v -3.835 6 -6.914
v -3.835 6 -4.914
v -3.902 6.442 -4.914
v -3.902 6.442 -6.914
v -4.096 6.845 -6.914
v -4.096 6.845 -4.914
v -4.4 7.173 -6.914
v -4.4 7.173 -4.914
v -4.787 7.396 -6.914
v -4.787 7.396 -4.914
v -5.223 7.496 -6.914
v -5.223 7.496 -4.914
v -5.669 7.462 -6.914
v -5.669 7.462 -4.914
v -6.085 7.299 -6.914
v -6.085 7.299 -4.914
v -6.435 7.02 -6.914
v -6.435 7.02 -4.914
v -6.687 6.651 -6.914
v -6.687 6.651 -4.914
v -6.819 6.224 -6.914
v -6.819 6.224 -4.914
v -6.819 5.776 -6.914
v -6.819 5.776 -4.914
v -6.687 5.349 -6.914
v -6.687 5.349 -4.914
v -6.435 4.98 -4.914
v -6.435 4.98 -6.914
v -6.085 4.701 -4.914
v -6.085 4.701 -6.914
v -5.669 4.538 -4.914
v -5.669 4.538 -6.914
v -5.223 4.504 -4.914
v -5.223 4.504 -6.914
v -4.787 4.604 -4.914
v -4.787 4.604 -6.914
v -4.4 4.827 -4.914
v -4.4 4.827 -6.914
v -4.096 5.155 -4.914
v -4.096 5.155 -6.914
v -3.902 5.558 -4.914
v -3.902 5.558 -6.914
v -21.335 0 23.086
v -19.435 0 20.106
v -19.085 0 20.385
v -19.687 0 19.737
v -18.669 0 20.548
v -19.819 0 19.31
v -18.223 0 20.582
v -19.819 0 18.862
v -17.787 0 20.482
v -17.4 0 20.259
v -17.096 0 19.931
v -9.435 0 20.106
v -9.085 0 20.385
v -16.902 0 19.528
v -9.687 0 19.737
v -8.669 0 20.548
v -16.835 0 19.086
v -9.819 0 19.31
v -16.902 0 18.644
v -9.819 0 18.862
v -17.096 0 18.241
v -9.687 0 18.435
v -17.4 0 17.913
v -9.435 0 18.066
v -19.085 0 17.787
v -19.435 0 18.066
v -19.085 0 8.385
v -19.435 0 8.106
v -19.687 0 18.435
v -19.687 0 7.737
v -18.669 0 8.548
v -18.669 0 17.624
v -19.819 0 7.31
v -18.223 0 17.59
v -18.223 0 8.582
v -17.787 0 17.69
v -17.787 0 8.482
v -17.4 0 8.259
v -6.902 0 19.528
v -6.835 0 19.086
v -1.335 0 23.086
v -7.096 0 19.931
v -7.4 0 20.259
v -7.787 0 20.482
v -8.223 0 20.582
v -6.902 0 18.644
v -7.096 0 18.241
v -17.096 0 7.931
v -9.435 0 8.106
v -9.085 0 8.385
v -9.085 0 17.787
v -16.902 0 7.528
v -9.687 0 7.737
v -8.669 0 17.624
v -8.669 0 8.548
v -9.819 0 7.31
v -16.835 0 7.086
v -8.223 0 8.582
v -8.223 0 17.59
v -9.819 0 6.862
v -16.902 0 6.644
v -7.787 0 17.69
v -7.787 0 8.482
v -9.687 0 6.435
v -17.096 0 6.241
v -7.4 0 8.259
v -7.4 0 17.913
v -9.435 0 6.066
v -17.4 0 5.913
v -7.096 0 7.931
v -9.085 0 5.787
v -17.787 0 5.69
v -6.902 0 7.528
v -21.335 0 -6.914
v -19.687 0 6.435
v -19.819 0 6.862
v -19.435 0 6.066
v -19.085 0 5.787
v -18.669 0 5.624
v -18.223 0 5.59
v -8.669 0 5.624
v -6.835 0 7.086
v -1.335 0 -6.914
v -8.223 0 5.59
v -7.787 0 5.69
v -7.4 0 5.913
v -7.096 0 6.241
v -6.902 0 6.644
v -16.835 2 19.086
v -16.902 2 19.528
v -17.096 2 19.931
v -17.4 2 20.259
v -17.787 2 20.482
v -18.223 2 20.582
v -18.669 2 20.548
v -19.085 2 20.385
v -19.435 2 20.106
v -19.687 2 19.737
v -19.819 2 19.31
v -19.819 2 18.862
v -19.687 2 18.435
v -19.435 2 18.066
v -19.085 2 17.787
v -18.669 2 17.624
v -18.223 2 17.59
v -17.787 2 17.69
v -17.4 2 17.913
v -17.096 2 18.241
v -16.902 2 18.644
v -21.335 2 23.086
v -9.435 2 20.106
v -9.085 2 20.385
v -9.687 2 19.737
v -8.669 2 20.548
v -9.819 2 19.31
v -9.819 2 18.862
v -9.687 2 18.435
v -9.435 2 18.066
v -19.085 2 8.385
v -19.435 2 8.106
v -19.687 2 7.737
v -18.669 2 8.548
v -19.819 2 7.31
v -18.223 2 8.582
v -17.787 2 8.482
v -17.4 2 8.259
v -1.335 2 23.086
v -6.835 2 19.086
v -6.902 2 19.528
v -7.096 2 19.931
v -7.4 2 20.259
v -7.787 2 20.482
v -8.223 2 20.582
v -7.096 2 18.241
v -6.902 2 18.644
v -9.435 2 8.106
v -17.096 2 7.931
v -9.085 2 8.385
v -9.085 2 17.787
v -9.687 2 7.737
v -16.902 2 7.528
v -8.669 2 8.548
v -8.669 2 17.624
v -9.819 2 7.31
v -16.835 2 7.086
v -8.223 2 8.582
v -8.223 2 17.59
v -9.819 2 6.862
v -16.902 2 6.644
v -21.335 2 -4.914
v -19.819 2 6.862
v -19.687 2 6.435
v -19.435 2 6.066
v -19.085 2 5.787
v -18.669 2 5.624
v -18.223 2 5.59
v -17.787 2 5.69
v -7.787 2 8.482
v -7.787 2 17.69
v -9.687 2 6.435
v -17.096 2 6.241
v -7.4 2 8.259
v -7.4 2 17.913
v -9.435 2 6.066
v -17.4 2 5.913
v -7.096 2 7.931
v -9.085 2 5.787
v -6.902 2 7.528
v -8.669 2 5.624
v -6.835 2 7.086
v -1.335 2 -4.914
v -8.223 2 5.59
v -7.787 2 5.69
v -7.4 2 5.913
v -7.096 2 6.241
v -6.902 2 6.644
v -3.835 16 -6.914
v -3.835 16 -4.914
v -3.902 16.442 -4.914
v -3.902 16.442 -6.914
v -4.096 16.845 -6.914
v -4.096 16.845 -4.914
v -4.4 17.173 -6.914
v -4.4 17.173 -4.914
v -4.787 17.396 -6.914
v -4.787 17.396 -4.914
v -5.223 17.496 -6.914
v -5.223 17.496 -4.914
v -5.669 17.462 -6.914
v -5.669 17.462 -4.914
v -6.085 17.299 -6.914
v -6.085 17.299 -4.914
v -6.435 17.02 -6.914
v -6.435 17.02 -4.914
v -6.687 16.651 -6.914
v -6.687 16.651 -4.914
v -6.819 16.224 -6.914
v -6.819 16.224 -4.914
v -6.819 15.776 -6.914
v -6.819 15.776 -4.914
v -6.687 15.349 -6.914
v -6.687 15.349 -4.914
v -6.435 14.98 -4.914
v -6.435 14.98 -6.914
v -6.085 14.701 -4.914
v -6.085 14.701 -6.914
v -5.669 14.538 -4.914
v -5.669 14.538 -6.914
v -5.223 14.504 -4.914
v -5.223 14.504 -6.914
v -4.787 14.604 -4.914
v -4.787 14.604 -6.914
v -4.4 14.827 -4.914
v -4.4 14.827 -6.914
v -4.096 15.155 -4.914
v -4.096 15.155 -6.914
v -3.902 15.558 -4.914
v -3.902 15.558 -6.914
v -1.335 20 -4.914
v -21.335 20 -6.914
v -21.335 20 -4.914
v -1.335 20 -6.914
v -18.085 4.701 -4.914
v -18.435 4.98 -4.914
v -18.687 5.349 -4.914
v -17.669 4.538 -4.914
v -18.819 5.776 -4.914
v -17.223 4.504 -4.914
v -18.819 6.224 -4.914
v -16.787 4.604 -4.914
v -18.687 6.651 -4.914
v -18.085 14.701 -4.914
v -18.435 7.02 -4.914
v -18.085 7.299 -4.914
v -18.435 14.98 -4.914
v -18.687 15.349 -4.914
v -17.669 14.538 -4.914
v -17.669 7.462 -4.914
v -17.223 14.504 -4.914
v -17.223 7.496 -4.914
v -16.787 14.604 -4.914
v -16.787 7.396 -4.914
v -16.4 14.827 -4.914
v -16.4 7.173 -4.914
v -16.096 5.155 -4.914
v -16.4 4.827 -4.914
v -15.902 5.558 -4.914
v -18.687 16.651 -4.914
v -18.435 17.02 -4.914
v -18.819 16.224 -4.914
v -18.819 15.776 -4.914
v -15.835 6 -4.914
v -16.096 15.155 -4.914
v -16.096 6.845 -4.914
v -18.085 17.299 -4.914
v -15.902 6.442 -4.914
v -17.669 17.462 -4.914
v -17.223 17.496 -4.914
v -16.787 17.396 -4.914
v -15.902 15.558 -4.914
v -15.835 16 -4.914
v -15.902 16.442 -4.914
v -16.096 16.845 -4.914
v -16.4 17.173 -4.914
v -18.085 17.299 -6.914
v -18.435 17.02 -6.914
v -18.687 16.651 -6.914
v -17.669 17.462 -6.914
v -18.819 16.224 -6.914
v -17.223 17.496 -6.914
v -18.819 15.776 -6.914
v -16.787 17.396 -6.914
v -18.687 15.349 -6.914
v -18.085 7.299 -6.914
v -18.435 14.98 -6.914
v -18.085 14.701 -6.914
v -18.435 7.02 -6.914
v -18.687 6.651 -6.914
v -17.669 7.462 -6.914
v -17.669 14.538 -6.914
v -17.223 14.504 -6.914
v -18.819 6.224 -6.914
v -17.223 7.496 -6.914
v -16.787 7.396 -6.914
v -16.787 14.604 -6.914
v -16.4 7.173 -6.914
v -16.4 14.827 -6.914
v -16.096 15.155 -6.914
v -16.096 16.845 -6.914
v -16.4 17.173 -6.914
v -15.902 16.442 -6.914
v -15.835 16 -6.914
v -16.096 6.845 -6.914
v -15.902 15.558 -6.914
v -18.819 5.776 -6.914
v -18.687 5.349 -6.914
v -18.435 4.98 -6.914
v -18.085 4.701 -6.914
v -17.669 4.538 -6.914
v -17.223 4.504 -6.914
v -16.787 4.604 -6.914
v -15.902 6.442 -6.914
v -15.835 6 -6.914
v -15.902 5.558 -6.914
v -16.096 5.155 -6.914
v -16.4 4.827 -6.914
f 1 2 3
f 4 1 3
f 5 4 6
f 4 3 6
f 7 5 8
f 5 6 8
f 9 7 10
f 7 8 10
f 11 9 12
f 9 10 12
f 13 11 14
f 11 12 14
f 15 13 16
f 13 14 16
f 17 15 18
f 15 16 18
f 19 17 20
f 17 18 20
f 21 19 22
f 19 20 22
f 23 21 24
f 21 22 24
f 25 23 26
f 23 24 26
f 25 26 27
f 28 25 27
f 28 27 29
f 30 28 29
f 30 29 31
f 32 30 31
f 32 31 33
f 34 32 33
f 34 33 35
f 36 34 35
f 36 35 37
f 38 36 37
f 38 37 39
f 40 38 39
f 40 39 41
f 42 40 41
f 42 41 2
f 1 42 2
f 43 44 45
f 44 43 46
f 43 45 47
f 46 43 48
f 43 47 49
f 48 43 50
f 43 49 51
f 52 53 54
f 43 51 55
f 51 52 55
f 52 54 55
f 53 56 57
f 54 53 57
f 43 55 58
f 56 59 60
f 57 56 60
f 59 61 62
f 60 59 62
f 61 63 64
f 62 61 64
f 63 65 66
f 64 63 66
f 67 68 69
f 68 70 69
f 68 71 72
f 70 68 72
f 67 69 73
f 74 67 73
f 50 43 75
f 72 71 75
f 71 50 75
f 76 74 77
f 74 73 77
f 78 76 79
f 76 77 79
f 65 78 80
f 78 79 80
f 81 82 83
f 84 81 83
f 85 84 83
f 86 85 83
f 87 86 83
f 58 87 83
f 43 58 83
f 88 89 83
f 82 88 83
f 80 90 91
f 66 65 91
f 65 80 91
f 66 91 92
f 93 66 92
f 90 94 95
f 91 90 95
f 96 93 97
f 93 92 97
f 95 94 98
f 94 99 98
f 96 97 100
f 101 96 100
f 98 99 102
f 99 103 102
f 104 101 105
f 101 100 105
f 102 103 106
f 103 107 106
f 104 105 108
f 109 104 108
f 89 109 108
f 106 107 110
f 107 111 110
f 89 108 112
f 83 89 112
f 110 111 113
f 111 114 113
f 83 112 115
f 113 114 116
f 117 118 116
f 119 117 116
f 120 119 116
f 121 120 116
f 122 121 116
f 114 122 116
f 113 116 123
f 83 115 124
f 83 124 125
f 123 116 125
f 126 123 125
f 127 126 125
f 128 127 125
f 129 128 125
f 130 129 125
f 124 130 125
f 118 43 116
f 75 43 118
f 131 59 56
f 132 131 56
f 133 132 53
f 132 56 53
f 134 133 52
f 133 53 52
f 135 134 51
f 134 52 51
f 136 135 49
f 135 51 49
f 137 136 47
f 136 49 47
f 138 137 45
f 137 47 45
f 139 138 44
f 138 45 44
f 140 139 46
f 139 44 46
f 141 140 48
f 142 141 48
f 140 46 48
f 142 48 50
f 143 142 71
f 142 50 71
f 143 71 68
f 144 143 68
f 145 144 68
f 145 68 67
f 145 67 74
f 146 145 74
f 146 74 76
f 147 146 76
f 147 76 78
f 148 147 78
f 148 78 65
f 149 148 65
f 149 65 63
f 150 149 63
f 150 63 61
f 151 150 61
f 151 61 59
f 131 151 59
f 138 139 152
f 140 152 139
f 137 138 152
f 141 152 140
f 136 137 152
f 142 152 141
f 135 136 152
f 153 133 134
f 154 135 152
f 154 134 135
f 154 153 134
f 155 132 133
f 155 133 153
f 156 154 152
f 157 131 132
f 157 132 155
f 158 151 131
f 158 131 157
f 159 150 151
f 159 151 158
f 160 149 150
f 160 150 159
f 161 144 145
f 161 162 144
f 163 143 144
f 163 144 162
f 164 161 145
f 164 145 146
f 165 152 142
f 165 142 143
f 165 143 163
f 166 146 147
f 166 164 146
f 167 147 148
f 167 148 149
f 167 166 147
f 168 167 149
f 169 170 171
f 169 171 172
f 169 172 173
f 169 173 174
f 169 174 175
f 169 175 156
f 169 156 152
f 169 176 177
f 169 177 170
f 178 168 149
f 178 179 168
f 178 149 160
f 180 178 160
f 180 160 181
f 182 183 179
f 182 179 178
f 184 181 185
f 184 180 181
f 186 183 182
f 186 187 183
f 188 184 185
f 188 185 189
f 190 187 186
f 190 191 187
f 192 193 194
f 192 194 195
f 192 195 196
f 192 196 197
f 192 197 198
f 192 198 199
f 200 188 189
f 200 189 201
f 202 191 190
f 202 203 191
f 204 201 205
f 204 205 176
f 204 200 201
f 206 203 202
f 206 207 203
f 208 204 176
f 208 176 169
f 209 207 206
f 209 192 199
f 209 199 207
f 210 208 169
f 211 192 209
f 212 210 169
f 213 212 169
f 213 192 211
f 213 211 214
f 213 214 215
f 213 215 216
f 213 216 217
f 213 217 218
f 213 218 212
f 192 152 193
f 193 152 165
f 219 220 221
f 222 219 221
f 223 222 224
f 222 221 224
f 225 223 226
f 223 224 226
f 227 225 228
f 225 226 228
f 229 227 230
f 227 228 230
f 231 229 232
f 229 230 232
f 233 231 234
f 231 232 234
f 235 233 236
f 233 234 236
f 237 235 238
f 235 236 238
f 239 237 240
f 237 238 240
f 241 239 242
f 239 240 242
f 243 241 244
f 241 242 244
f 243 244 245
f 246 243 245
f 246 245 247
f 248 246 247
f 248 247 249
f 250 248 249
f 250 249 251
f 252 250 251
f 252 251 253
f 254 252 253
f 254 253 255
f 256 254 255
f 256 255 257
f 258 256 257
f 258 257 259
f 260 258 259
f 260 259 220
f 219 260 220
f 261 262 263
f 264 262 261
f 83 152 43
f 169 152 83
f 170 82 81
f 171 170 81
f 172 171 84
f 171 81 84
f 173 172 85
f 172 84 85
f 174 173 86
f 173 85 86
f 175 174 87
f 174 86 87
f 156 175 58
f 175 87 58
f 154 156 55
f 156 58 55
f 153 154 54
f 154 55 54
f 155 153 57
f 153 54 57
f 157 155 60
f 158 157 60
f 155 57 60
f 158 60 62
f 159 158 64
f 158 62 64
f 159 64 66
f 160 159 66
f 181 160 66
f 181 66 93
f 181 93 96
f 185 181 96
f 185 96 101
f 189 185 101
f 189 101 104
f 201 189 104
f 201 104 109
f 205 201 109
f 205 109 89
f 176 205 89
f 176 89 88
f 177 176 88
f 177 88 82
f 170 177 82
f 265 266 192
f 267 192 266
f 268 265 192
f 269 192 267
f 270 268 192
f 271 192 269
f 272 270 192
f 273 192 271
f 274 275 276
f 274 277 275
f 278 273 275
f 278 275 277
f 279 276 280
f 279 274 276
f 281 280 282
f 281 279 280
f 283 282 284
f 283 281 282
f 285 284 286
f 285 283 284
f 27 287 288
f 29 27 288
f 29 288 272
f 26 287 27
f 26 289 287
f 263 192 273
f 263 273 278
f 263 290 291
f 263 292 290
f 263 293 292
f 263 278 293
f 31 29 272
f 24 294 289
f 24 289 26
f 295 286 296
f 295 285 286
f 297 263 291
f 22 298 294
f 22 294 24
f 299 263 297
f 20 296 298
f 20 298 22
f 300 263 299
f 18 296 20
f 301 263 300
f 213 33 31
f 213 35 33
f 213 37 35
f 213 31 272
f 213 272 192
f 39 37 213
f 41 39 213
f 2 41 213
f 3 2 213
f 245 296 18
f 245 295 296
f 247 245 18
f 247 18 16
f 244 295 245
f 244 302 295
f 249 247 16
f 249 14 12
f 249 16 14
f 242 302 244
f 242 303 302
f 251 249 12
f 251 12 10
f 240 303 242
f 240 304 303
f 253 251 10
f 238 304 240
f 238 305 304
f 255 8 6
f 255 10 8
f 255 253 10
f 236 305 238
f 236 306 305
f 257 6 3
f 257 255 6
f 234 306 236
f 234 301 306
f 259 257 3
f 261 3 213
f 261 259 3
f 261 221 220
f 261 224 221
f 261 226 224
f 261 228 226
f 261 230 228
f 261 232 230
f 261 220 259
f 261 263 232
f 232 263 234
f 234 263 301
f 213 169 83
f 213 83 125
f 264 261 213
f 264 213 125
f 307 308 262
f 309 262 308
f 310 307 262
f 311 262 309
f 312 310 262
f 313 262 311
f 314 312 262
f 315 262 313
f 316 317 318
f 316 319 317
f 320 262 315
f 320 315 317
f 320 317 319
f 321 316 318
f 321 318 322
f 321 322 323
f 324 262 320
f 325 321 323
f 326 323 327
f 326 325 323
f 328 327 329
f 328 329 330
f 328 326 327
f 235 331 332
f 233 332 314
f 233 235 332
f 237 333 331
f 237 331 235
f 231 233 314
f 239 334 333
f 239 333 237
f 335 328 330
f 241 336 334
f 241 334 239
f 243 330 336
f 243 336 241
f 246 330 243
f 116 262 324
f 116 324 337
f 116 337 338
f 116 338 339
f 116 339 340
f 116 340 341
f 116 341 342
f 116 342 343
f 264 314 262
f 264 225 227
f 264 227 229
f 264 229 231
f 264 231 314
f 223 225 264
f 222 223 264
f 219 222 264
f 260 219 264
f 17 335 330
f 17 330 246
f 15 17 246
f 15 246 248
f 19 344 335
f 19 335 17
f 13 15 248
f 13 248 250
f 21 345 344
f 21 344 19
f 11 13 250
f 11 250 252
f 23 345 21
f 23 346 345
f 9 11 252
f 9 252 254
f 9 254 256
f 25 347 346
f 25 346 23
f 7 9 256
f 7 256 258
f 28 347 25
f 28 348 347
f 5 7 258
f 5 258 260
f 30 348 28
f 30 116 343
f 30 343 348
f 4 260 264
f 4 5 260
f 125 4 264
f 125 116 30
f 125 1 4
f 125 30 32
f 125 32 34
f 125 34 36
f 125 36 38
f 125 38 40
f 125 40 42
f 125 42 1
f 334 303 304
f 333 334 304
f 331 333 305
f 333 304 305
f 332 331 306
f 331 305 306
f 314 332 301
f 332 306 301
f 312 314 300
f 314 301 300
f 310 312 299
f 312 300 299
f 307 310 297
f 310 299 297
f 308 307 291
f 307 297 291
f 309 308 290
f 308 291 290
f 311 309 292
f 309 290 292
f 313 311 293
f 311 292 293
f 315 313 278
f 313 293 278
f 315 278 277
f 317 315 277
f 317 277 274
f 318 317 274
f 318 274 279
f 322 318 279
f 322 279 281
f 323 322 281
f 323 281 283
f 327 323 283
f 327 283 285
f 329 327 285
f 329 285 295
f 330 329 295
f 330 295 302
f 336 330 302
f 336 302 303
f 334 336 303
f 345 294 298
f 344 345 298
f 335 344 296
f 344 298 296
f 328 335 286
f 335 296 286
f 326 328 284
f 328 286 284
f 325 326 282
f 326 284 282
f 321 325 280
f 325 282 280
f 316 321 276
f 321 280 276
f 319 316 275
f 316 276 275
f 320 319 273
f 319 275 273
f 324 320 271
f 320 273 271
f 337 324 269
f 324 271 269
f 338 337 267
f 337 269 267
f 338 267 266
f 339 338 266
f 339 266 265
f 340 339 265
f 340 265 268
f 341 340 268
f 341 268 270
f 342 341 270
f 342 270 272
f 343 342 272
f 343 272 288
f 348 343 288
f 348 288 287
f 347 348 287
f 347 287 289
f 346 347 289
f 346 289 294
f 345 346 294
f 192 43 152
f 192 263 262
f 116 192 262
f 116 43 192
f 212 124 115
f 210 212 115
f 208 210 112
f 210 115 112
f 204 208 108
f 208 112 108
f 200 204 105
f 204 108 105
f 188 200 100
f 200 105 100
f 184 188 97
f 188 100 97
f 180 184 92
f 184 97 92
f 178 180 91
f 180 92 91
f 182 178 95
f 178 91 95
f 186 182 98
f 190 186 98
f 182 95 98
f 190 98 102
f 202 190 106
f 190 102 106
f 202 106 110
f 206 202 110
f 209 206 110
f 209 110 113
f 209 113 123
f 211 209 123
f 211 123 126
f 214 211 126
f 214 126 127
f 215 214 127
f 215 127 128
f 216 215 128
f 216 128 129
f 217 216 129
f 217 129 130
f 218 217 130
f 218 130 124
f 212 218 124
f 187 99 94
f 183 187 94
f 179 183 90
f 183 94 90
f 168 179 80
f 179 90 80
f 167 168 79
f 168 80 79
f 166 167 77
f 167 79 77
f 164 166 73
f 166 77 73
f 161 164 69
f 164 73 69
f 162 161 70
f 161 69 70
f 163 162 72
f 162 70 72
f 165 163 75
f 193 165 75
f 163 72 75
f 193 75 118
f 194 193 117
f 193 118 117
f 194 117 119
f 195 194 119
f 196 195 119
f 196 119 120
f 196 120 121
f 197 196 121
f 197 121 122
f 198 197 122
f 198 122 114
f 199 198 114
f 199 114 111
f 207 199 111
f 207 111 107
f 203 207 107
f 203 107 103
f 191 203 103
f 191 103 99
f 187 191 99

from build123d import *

# Parameters (mm, degrees)
SKETCH_1_W          = 30
SKETCH_1_H          = 40
EXTRUDE_1_DEPTH     = 3
SKETCH_2_W          = 30
SKETCH_2_H          = 3
EXTRUDE_2_DEPTH     = 17
SKETCH_5_W          = 37
SKETCH_5_H          = 3
CUT_EXTRUDE_3_DEPTH = 10
SKETCH_6_W          = 20
SKETCH_6_H          = 3
CUT_EXTRUDE_4_DEPTH = 10
SKETCH_7_W          = 20
SKETCH_7_H          = 17
CUT_EXTRUDE_5_DEPTH = 1
SKETCH_8_W          = 20
SKETCH_8_H          = 28
CUT_EXTRUDE_6_DEPTH = 1
SKETCH_10_R         = 1.5
CUT_EXTRUDE_7_DEPTH = 10
SKETCH_11_R         = 1.5
CUT_EXTRUDE_8_DEPTH = 10


with BuildPart() as part:
    # 草图1 → 凸台-拉伸1 (new body)
    with BuildSketch(Plane(origin=(0, 0, 0), x_dir=(1, 0, 0), z_dir=(0, 1, 0))):
        with Locations((-6.335311573, -13.086053412)):
            Rectangle(SKETCH_1_W, SKETCH_1_H)
    extrude(amount=EXTRUDE_1_DEPTH)

    # 草图2 → 凸台-拉伸2 (add)
    with BuildSketch(Plane(origin=(0, 3, 0), x_dir=(1, 0, 0), z_dir=(0, 1, 0))):
        with Locations((-6.335311573, 5.413946588)):
            Rectangle(SKETCH_2_W, SKETCH_2_H)
    extrude(amount=EXTRUDE_2_DEPTH)

    # 草图5 → 切除-拉伸3 (cut)
    with BuildSketch(Plane(origin=(8.664688427, 0, 0), x_dir=(0, 0, -1), z_dir=(1, 0, 0))):
        Polygon((6.913946588, 20), (3.913946588, 20), (3.913946588, 3), (3.913946588, 0), (6.913946588, 0), align=None)
        with Locations((-14.586053412, 1.5)):
            Rectangle(SKETCH_5_W, SKETCH_5_H)
    extrude(amount=-CUT_EXTRUDE_3_DEPTH, mode=Mode.SUBTRACT)

    # 草图6 → 切除-拉伸4 (cut)
    with BuildSketch(Plane.XY.offset(33.086053412)):
        with Locations((-11.335311573, 1.5)):
            Rectangle(SKETCH_6_W, SKETCH_6_H)
    extrude(amount=-CUT_EXTRUDE_4_DEPTH, mode=Mode.SUBTRACT)

    # 草图7 → 切除-拉伸5 (cut)
    with BuildSketch(Plane.XY.offset(-3.913946588)):
        with Locations((-11.335311573, 11.5)):
            Rectangle(SKETCH_7_W, SKETCH_7_H)
    extrude(amount=-CUT_EXTRUDE_5_DEPTH, mode=Mode.SUBTRACT)

    # 草图8 → 切除-拉伸6 (cut)
    with BuildSketch(Plane(origin=(0, 3, 0), x_dir=(1, 0, 0), z_dir=(0, 1, 0))):
        with Locations((-11.335311573, -9.086053412)):
            Rectangle(SKETCH_8_W, SKETCH_8_H)
    extrude(amount=-CUT_EXTRUDE_6_DEPTH, mode=Mode.SUBTRACT)

    # 草图10 → 切除-拉伸7 (cut)
    with BuildSketch(Plane.XZ):
        with Locations((-8.335311573, 7.086053412)):
            Circle(SKETCH_10_R)
        with Locations((-8.335311573, 19.086053412)):
            Circle(SKETCH_10_R)
        with Locations((-18.335311573, 7.086053412)):
            Circle(SKETCH_10_R)
        with Locations((-18.335311573, 19.086053412)):
            Circle(SKETCH_10_R)
    extrude(amount=-CUT_EXTRUDE_7_DEPTH, mode=Mode.SUBTRACT)

    # 草图11 → 切除-拉伸8 (cut)
    with BuildSketch(Plane.XY.offset(-4.913946588)):
        with Locations((-5.335311573, 6)):
            Circle(SKETCH_11_R)
        with Locations((-17.335311573, 6)):
            Circle(SKETCH_11_R)
        with Locations((-5.335311573, 16)):
            Circle(SKETCH_11_R)
        with Locations((-17.335311573, 16)):
            Circle(SKETCH_11_R)
    extrude(amount=-CUT_EXTRUDE_8_DEPTH, mode=Mode.SUBTRACT)


solid = part.part
